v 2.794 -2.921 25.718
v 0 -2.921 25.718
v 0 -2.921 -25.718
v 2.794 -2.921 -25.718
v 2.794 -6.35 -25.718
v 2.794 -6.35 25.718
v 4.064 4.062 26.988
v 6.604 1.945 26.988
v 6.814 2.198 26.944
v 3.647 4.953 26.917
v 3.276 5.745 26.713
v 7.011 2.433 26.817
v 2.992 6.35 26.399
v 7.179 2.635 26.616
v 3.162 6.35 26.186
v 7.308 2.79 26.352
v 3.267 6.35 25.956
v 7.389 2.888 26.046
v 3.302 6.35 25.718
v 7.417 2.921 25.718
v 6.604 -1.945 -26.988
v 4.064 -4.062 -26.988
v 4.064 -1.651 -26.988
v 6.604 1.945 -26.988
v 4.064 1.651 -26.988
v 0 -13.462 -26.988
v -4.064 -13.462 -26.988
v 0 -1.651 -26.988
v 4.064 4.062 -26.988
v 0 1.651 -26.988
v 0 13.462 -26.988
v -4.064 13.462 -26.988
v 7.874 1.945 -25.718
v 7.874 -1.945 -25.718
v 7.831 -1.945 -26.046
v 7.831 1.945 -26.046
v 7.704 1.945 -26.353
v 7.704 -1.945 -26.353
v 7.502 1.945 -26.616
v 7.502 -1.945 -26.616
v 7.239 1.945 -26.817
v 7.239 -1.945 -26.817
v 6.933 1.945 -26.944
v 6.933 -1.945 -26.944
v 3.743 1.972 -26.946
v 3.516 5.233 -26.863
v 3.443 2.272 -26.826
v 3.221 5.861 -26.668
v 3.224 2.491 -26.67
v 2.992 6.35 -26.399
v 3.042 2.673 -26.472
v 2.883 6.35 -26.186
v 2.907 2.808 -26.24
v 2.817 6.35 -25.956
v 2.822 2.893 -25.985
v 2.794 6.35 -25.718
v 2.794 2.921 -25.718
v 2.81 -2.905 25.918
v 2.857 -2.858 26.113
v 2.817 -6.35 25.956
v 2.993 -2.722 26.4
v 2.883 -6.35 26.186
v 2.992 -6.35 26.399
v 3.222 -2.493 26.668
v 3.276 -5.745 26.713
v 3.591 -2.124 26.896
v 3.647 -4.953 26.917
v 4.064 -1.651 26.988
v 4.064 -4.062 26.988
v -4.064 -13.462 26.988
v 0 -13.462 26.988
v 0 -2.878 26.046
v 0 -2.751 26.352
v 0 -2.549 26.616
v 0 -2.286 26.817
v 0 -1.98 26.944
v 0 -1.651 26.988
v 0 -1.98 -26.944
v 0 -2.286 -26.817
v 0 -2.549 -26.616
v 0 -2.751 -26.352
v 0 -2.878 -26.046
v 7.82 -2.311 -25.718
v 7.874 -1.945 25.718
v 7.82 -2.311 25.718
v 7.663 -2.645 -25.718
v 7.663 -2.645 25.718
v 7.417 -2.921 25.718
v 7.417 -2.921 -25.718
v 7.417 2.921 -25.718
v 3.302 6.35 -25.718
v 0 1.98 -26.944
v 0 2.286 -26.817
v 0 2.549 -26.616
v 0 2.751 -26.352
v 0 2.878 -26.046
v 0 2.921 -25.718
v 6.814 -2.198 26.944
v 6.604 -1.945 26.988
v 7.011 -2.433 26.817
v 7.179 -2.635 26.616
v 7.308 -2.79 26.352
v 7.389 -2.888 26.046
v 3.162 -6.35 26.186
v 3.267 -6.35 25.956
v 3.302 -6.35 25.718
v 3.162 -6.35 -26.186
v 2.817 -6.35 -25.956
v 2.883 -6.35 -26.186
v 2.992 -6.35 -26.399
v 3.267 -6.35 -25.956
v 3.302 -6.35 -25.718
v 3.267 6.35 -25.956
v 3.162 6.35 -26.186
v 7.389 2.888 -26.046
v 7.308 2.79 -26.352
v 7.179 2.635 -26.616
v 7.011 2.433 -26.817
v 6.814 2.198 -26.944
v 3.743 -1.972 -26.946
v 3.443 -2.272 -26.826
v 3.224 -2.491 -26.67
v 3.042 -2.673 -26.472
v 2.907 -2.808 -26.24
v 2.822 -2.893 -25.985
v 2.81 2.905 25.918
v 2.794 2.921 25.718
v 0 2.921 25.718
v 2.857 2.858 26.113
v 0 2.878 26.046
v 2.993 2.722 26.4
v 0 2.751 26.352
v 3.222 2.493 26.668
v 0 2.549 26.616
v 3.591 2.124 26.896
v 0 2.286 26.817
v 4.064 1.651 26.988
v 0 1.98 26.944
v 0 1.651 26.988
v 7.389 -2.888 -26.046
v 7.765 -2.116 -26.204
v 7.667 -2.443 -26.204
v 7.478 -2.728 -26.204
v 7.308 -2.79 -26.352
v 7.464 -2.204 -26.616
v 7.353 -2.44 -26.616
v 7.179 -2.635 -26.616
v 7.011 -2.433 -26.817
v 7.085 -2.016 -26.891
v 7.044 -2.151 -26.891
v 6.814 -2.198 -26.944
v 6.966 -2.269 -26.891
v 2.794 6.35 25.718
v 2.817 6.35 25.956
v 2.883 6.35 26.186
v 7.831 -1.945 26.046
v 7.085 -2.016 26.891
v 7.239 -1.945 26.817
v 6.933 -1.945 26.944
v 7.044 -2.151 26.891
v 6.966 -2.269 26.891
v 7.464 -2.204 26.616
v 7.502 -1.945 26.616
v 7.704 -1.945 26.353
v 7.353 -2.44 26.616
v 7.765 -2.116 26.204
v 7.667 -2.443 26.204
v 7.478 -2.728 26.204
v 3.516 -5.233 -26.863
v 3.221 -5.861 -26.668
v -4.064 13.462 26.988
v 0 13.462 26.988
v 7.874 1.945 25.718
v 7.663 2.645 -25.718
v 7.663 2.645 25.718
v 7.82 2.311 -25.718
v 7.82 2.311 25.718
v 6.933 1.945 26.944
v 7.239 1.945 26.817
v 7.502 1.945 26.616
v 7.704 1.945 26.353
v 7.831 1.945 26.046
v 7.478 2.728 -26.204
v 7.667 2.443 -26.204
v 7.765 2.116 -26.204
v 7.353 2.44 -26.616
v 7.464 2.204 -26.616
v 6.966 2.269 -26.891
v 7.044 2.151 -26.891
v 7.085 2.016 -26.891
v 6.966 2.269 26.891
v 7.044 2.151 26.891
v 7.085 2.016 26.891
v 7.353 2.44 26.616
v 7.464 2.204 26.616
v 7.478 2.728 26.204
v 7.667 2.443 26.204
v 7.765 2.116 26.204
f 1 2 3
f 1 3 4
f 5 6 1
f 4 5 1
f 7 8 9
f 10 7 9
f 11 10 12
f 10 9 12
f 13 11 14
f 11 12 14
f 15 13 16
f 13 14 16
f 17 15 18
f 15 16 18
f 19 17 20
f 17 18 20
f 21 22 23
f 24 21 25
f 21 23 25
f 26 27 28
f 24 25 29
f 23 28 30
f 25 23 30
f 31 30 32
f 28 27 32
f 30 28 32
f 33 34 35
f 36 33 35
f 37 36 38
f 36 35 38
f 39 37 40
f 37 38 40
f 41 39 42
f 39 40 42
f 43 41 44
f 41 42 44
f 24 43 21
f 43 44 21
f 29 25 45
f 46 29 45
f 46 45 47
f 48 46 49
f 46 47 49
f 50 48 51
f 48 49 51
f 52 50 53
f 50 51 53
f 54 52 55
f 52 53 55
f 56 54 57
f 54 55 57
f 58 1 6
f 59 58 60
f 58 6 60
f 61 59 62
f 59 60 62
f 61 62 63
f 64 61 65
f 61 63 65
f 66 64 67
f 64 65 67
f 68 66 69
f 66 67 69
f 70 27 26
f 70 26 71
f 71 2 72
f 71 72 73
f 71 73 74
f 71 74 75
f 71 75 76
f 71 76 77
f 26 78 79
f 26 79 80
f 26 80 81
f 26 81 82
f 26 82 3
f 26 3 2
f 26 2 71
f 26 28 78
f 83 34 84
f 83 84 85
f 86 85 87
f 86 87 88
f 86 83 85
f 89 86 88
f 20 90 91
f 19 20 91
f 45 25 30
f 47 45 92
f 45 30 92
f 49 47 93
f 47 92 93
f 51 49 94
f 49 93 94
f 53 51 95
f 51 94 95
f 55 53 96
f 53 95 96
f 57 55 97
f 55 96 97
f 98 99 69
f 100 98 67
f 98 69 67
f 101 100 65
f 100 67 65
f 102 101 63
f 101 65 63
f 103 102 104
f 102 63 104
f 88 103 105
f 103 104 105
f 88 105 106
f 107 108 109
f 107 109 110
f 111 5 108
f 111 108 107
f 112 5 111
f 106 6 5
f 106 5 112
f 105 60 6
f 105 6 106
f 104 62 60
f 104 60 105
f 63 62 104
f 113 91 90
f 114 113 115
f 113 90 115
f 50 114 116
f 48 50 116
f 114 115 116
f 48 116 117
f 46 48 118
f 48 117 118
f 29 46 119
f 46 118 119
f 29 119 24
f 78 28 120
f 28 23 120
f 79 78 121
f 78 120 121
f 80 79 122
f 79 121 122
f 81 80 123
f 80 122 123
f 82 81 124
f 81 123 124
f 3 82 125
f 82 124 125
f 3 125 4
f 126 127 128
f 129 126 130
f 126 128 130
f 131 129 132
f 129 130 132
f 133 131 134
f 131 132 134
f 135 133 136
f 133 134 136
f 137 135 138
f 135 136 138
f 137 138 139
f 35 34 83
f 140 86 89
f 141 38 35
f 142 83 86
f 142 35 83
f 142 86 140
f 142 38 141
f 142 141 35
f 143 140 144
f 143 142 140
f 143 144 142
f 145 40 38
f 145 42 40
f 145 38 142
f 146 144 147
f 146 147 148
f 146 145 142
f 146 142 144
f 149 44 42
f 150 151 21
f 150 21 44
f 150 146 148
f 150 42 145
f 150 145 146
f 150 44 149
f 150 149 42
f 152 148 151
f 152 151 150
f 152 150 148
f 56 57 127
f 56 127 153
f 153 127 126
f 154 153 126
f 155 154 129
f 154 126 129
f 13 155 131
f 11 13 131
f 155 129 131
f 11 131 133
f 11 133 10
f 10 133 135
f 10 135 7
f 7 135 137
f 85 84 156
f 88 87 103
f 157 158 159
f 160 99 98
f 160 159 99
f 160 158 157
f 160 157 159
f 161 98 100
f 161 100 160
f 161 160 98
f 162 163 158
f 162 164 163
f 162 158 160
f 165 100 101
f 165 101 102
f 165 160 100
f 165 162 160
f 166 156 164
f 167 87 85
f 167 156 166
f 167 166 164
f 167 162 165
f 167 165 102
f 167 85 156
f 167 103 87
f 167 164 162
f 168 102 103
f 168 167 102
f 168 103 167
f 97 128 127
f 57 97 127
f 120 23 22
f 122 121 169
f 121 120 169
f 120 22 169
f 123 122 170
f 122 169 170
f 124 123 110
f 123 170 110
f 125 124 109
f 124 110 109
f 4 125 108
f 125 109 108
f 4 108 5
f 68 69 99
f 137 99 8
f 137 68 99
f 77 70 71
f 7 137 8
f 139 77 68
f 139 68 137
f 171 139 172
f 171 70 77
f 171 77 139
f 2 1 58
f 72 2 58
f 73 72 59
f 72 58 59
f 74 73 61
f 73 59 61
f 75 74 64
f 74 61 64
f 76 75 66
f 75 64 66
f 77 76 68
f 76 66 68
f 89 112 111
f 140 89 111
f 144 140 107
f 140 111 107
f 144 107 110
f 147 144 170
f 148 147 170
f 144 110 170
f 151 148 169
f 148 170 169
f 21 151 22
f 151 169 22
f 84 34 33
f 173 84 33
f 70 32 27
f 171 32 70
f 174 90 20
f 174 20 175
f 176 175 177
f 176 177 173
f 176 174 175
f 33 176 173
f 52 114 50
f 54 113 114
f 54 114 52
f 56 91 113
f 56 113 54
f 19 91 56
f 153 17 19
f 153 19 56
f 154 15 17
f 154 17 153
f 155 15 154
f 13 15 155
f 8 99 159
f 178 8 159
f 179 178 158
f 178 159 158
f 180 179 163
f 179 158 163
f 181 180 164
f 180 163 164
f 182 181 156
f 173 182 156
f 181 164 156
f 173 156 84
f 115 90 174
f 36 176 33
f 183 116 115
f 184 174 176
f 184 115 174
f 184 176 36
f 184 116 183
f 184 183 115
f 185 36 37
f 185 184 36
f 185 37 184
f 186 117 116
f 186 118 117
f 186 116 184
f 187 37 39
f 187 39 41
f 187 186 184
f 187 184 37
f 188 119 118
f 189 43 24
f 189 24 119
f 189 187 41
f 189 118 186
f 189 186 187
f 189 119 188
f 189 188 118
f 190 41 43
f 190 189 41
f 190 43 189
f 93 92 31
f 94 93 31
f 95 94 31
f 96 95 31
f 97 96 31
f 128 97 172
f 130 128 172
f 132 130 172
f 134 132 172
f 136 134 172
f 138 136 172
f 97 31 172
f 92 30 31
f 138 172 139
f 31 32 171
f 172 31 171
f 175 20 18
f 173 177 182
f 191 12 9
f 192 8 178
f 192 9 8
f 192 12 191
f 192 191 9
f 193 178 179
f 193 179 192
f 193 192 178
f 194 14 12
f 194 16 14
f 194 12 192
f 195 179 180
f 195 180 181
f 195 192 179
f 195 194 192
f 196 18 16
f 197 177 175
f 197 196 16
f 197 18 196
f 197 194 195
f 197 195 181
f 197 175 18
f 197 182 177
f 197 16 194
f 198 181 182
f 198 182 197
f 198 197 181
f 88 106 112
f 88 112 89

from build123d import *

# Parameters (mm, degrees)
BOSS_EXTRUDE1_DEPTH = 53.975
SKETCH2_W           = 6.858
SKETCH2_H           = 3.429
CUT_EXTRUDE1_DEPTH  = 55.91468839
SKETCH4_W           = 6.858
SKETCH4_H           = 3.429
CUT_EXTRUDE2_DEPTH  = 55.91468839
SKETCH18_W          = 53.975
SKETCH18_H          = 26.924
BOSS_EXTRUDE5_DEPTH = 4.064
FILLET1_R           = 1.27
FILLET3_R           = 1.27
FILLET5_R           = 1.27


with BuildPart() as part:
    # Sketch1 → Boss-Extrude1 (new body)
    with BuildSketch(Plane.XY.offset(26.9875)):
        Polygon((3.302, 6.35), (-4.064, 6.35), (-4.064, -6.35), (3.302, -6.35), (7.874, -2.54), (7.874, 2.54), align=None)
    extrude(amount=-BOSS_EXTRUDE1_DEPTH)

    # Sketch2 → Cut-Extrude1 (cut, through all)
    with BuildSketch(Plane.XY.offset(26.9875)):
        with Locations((-0.635, 4.6355)):
            Rectangle(SKETCH2_W, SKETCH2_H)
    extrude(amount=-CUT_EXTRUDE1_DEPTH, mode=Mode.SUBTRACT)

    # Sketch4 → Cut-Extrude2 (cut, through all)
    with BuildSketch(Plane.XY.offset(26.9875)):
        with Locations((-0.635, -4.6355)):
            Rectangle(SKETCH4_W, SKETCH4_H)
    extrude(amount=-CUT_EXTRUDE2_DEPTH, mode=Mode.SUBTRACT)

    # Sketch18 → Boss-Extrude5 (add)
    with BuildSketch(Plane.ZY.offset(4.064)):
        Rectangle(SKETCH18_W, SKETCH18_H)
    extrude(amount=-BOSS_EXTRUDE5_DEPTH)

    # Fillet1
    fillet1_edges = [part.edges().sort_by_distance(p)[0] for p in [
        (7.874, 2.54, 0),
        (7.874, -2.54, 0),
    ]]
    fillet(fillet1_edges, radius=FILLET1_R)

    # Fillet3
    # the kernel refuses this fillet: 1.27 mm, written as the material it takes off along each edge
    with BuildSketch(Plane(origin=(0.862897437, -8.382585469, -26.9875), x_dir=(-0.6401843996644798, 0.7682212795973759, 0), z_dir=(0.7682212795973759, 0.6401843996644799, 0))) as fillet3_piece_1:
        with BuildLine():
            CenterArc((FILLET3_R, FILLET3_R), FILLET3_R, 180, 90)
            Line((0, FILLET3_R), (0, 0))
            Line((0, 0), (FILLET3_R, 0))
        make_face()
    extrude(amount=8.531574072, mode=Mode.SUBTRACT)
    with BuildSketch(Plane(origin=(6.604, -1.945163819, -26.9875), x_dir=(1, 0, 0), z_dir=(0, 1, 0))) as fillet3_piece_2:
        with BuildLine():
            CenterArc((1.27 - FILLET3_R, -FILLET3_R), FILLET3_R, 0, 90)
            Line((1.27, -FILLET3_R), (1.27, 0))
            Line((1.27, 0), (1.27 - FILLET3_R, 0))
        make_face()
    revolve(axis=Axis((6.604, -1.945163819, -26.9875), (0, 0, -1)), revolution_arc=50.194428908, mode=Mode.SUBTRACT)
    with BuildSketch(Plane(origin=(7.417034188, 2.920804844, -26.9875), x_dir=(0, 0, 1), z_dir=(-0.7682212795973759, 0.6401843996644799, 0))) as fillet3_piece_3:
        with BuildLine():
            CenterArc((FILLET3_R, -FILLET3_R), FILLET3_R, 90, 90)
            Line((0, -FILLET3_R), (0, 0))
            Line((0, 0), (FILLET3_R, 0))
        make_face()
    extrude(amount=8.531574072, mode=Mode.SUBTRACT)
    with BuildSketch(Plane(origin=(6.604, 1.945163819, -26.9875), x_dir=(0.6401843996644799, 0.7682212795973757, 0), z_dir=(-0.7682212795973757, 0.6401843996644799, 0))) as fillet3_piece_4:
        with BuildLine():
            CenterArc((1.27 - FILLET3_R, -FILLET3_R), FILLET3_R, 0, 90)
            Line((1.27 - FILLET3_R, 0), (1.27, 0))
            Line((1.27, 0), (1.27, -FILLET3_R))
        make_face()
    revolve(axis=Axis((6.604, 1.945163819, -26.9875), (0, 0, -1)), revolution_arc=50.194428908, mode=Mode.SUBTRACT)
    with BuildSketch(Plane(origin=(2.794, -2.921, -26.9875), x_dir=(0, 1, 0), z_dir=(-1, 0, 0)), Plane(origin=(0, 2.921, -26.9875), x_dir=(0, -1, 0), z_dir=(1, 0, 0))) as fillet3_piece_5:
        with BuildLine():
            CenterArc((FILLET3_R, -FILLET3_R), FILLET3_R, 90, 90)
            Line((0, -FILLET3_R), (0, 0))
            Line((0, 0), (FILLET3_R, 0))
        make_face()
    extrude(amount=2.794, mode=Mode.SUBTRACT)
    with BuildSketch(Plane(origin=(2.794, 2.921, -26.9875), x_dir=(1, 0, 0), z_dir=(0, 1, 0)), Plane(origin=(2.794, -9.525, -26.9875), x_dir=(1, 0, 0), z_dir=(0, 1, 0))) as fillet3_piece_6:
        with BuildLine():
            CenterArc((FILLET3_R, -FILLET3_R), FILLET3_R, 90, 90)
            Line((0, -FILLET3_R), (0, 0))
            Line((0, 0), (FILLET3_R, 0))
        make_face()
    extrude(amount=6.604, mode=Mode.SUBTRACT)
    with BuildSketch(Plane(origin=(7.874, -1.945163819, -26.9875), x_dir=(-1, 0, 0), z_dir=(0, 1, 0))) as fillet3_piece_7:
        with BuildLine():
            CenterArc((FILLET3_R, FILLET3_R), FILLET3_R, 180, 90)
            Line((0, FILLET3_R), (0, 0))
            Line((0, 0), (FILLET3_R, 0))
        make_face()
    extrude(amount=3.890327637, mode=Mode.SUBTRACT)
    with BuildSketch(Plane(origin=(2.794, -9.525, -26.9875), x_dir=(1, 0, 0), z_dir=(0, 1, 0))) as fillet3_piece_8a_section:
        with BuildLine():
            CenterArc((FILLET3_R, -FILLET3_R), FILLET3_R, 90, 90)
            Line((0, -FILLET3_R), (0, 0))
            Line((0, 0), (FILLET3_R, 0))
        make_face()
    fillet3_piece_8a = extrude(amount=9.779, mode=Mode.PRIVATE)
    fillet3_piece_8a = split(fillet3_piece_8a, bisect_by=Plane(origin=(3.081521795, -2.921, -26.699978205), z_dir=(0, 1, 0)), keep=Keep.TOP, mode=Mode.PRIVATE)
    with BuildSketch(Plane(origin=(5.969, -2.921, -26.9875), x_dir=(0, 1, 0), z_dir=(-1, 0, 0))) as fillet3_piece_8b_section:
        with BuildLine():
            CenterArc((FILLET3_R, -FILLET3_R), FILLET3_R, 90, 90)
            Line((0, -FILLET3_R), (0, 0))
            Line((0, 0), (FILLET3_R, 0))
        make_face()
    fillet3_piece_8b = extrude(amount=5.969, mode=Mode.PRIVATE)
    fillet3_piece_8b = split(fillet3_piece_8b, bisect_by=Plane(origin=(2.794, -2.633478205, -26.699978205), z_dir=(1, 0, 0)), keep=Keep.TOP, mode=Mode.PRIVATE)
    fillet3_piece_8 = fillet3_piece_8a & fillet3_piece_8b
    add(fillet3_piece_8, mode=Mode.SUBTRACT)
    with BuildSketch(Plane(origin=(2.794, -0.254, -26.9875), x_dir=(1, 0, 0), z_dir=(0, 1, 0))) as fillet3_piece_9a_section:
        with BuildLine():
            CenterArc((FILLET3_R, -FILLET3_R), FILLET3_R, 90, 90)
            Line((0, -FILLET3_R), (0, 0))
            Line((0, 0), (FILLET3_R, 0))
        make_face()
    fillet3_piece_9a = extrude(amount=9.779, mode=Mode.PRIVATE)
    fillet3_piece_9a = split(fillet3_piece_9a, bisect_by=Plane(origin=(3.081521795, 2.921, -26.699978205), z_dir=(0, -1, 0)), keep=Keep.TOP, mode=Mode.PRIVATE)
    with BuildSketch(Plane(origin=(0, 2.921, -26.9875), x_dir=(0, -1, 0), z_dir=(1, 0, 0))) as fillet3_piece_9b_section:
        with BuildLine():
            CenterArc((FILLET3_R, -FILLET3_R), FILLET3_R, 90, 90)
            Line((0, -FILLET3_R), (0, 0))
            Line((0, 0), (FILLET3_R, 0))
        make_face()
    fillet3_piece_9b = extrude(amount=5.969, mode=Mode.PRIVATE)
    fillet3_piece_9b = split(fillet3_piece_9b, bisect_by=Plane(origin=(2.794, 2.633478205, -26.699978205), z_dir=(1, 0, 0)), keep=Keep.TOP, mode=Mode.PRIVATE)
    fillet3_piece_9 = fillet3_piece_9a & fillet3_piece_9b
    add(fillet3_piece_9, mode=Mode.SUBTRACT)

    # Fillet5
    # the kernel refuses this fillet: 1.27 mm, written as the material it takes off along each edge
    with BuildSketch(Plane(origin=(0.862897437, -8.382585469, 26.9875), x_dir=(0, 0, -1), z_dir=(0.7682212795973759, 0.6401843996644799, 0)), Plane(origin=(7.417034188, 2.920804844, 26.9875), x_dir=(0, 0, -1), z_dir=(-0.7682212795973759, 0.6401843996644799, 0))) as fillet5_piece_1:
        with BuildLine():
            CenterArc((FILLET5_R, FILLET5_R), FILLET5_R, 180, 90)
            Line((0, FILLET5_R), (0, 0))
            Line((0, 0), (FILLET5_R, 0))
        make_face()
    extrude(amount=8.531574072, mode=Mode.SUBTRACT)
    with BuildSketch(Plane(origin=(6.604, -1.945163819, 26.9875), x_dir=(1, 0, 0), z_dir=(0, 1, 0))) as fillet5_piece_2:
        with BuildLine():
            CenterArc((1.27 - FILLET5_R, FILLET5_R), FILLET5_R, 270, 90)
            Line((1.27 - FILLET5_R, 0), (1.27, 0))
            Line((1.27, 0), (1.27, FILLET5_R))
        make_face()
    revolve(axis=Axis((6.604, -1.945163819, 26.9875), (0, 0, -1)), revolution_arc=50.194428908, mode=Mode.SUBTRACT)
    with BuildSketch(Plane(origin=(6.604, 1.945163819, 26.9875), x_dir=(0.6401843996644799, 0.7682212795973757, 0), z_dir=(-0.7682212795973757, 0.6401843996644799, 0))) as fillet5_piece_3:
        with BuildLine():
            CenterArc((1.27 - FILLET5_R, FILLET5_R), FILLET5_R, 270, 90)
            Line((1.27 - FILLET5_R, 0), (1.27, 0))
            Line((1.27, 0), (1.27, FILLET5_R))
        make_face()
    revolve(axis=Axis((6.604, 1.945163819, 26.9875), (0, 0, -1)), revolution_arc=50.194428908, mode=Mode.SUBTRACT)
    with BuildSketch(Plane(origin=(2.794, 2.921, 26.9875), x_dir=(0, 0, -1), z_dir=(0, 1, 0)), Plane(origin=(2.794, -9.525, 26.9875), x_dir=(0, 0, -1), z_dir=(0, 1, 0))) as fillet5_piece_4:
        with BuildLine():
            CenterArc((FILLET5_R, -FILLET5_R), FILLET5_R, 90, 90)
            Line((0, -FILLET5_R), (0, 0))
            Line((0, 0), (FILLET5_R, 0))
        make_face()
    extrude(amount=6.604, mode=Mode.SUBTRACT)
    with BuildSketch(Plane(origin=(0, 2.921, 26.9875), x_dir=(0, 0, -1), z_dir=(1, 0, 0)), Plane(origin=(2.794, -2.921, 26.9875), x_dir=(0, 0, -1), z_dir=(-1, 0, 0))) as fillet5_piece_5:
        with BuildLine():
            CenterArc((FILLET5_R, -FILLET5_R), FILLET5_R, 90, 90)
            Line((0, -FILLET5_R), (0, 0))
            Line((0, 0), (FILLET5_R, 0))
        make_face()
    extrude(amount=2.794, mode=Mode.SUBTRACT)
    with BuildSketch(Plane(origin=(7.874, -1.945163819, 26.9875), x_dir=(0, 0, -1), z_dir=(0, 1, 0))) as fillet5_piece_6:
        with BuildLine():
            CenterArc((FILLET5_R, FILLET5_R), FILLET5_R, 180, 90)
            Line((0, FILLET5_R), (0, 0))
            Line((0, 0), (FILLET5_R, 0))
        make_face()
    extrude(amount=3.890327637, mode=Mode.SUBTRACT)
    with BuildSketch(Plane(origin=(0, 2.921, 26.9875), x_dir=(0, 0, -1), z_dir=(1, 0, 0))) as fillet5_piece_7a_section:
        with BuildLine():
            CenterArc((FILLET5_R, -FILLET5_R), FILLET5_R, 90, 90)
            Line((0, -FILLET5_R), (0, 0))
            Line((0, 0), (FILLET5_R, 0))
        make_face()
    fillet5_piece_7a = extrude(amount=5.969, mode=Mode.PRIVATE)
    fillet5_piece_7a = split(fillet5_piece_7a, bisect_by=Plane(origin=(2.794, 2.633478205, 26.699978205), z_dir=(1, 0, 0)), keep=Keep.TOP, mode=Mode.PRIVATE)
    with BuildSketch(Plane(origin=(2.794, -0.254, 26.9875), x_dir=(0, 0, -1), z_dir=(0, 1, 0))) as fillet5_piece_7b_section:
        with BuildLine():
            CenterArc((FILLET5_R, -FILLET5_R), FILLET5_R, 90, 90)
            Line((0, -FILLET5_R), (0, 0))
            Line((0, 0), (FILLET5_R, 0))
        make_face()
    fillet5_piece_7b = extrude(amount=9.779, mode=Mode.PRIVATE)
    fillet5_piece_7b = split(fillet5_piece_7b, bisect_by=Plane(origin=(3.081521795, 2.921, 26.699978205), z_dir=(0, -1, 0)), keep=Keep.TOP, mode=Mode.PRIVATE)
    fillet5_piece_7 = fillet5_piece_7a & fillet5_piece_7b
    add(fillet5_piece_7, mode=Mode.SUBTRACT)
    with BuildSketch(Plane(origin=(2.794, -9.525, 26.9875), x_dir=(0, 0, -1), z_dir=(0, 1, 0))) as fillet5_piece_8a_section:
        with BuildLine():
            CenterArc((FILLET5_R, -FILLET5_R), FILLET5_R, 90, 90)
            Line((0, -FILLET5_R), (0, 0))
            Line((0, 0), (FILLET5_R, 0))
        make_face()
    fillet5_piece_8a = extrude(amount=9.779, mode=Mode.PRIVATE)
    fillet5_piece_8a = split(fillet5_piece_8a, bisect_by=Plane(origin=(3.081521795, -2.921, 26.699978205), z_dir=(0, 1, 0)), keep=Keep.TOP, mode=Mode.PRIVATE)
    with BuildSketch(Plane(origin=(5.969, -2.921, 26.9875), x_dir=(0, 0, -1), z_dir=(-1, 0, 0))) as fillet5_piece_8b_section:
        with BuildLine():
            CenterArc((FILLET5_R, -FILLET5_R), FILLET5_R, 90, 90)
            Line((0, -FILLET5_R), (0, 0))
            Line((0, 0), (FILLET5_R, 0))
        make_face()
    fillet5_piece_8b = extrude(amount=5.969, mode=Mode.PRIVATE)
    fillet5_piece_8b = split(fillet5_piece_8b, bisect_by=Plane(origin=(2.794, -2.633478205, 26.699978205), z_dir=(1, 0, 0)), keep=Keep.TOP, mode=Mode.PRIVATE)
    fillet5_piece_8 = fillet5_piece_8a & fillet5_piece_8b
    add(fillet5_piece_8, mode=Mode.SUBTRACT)


solid = part.part
